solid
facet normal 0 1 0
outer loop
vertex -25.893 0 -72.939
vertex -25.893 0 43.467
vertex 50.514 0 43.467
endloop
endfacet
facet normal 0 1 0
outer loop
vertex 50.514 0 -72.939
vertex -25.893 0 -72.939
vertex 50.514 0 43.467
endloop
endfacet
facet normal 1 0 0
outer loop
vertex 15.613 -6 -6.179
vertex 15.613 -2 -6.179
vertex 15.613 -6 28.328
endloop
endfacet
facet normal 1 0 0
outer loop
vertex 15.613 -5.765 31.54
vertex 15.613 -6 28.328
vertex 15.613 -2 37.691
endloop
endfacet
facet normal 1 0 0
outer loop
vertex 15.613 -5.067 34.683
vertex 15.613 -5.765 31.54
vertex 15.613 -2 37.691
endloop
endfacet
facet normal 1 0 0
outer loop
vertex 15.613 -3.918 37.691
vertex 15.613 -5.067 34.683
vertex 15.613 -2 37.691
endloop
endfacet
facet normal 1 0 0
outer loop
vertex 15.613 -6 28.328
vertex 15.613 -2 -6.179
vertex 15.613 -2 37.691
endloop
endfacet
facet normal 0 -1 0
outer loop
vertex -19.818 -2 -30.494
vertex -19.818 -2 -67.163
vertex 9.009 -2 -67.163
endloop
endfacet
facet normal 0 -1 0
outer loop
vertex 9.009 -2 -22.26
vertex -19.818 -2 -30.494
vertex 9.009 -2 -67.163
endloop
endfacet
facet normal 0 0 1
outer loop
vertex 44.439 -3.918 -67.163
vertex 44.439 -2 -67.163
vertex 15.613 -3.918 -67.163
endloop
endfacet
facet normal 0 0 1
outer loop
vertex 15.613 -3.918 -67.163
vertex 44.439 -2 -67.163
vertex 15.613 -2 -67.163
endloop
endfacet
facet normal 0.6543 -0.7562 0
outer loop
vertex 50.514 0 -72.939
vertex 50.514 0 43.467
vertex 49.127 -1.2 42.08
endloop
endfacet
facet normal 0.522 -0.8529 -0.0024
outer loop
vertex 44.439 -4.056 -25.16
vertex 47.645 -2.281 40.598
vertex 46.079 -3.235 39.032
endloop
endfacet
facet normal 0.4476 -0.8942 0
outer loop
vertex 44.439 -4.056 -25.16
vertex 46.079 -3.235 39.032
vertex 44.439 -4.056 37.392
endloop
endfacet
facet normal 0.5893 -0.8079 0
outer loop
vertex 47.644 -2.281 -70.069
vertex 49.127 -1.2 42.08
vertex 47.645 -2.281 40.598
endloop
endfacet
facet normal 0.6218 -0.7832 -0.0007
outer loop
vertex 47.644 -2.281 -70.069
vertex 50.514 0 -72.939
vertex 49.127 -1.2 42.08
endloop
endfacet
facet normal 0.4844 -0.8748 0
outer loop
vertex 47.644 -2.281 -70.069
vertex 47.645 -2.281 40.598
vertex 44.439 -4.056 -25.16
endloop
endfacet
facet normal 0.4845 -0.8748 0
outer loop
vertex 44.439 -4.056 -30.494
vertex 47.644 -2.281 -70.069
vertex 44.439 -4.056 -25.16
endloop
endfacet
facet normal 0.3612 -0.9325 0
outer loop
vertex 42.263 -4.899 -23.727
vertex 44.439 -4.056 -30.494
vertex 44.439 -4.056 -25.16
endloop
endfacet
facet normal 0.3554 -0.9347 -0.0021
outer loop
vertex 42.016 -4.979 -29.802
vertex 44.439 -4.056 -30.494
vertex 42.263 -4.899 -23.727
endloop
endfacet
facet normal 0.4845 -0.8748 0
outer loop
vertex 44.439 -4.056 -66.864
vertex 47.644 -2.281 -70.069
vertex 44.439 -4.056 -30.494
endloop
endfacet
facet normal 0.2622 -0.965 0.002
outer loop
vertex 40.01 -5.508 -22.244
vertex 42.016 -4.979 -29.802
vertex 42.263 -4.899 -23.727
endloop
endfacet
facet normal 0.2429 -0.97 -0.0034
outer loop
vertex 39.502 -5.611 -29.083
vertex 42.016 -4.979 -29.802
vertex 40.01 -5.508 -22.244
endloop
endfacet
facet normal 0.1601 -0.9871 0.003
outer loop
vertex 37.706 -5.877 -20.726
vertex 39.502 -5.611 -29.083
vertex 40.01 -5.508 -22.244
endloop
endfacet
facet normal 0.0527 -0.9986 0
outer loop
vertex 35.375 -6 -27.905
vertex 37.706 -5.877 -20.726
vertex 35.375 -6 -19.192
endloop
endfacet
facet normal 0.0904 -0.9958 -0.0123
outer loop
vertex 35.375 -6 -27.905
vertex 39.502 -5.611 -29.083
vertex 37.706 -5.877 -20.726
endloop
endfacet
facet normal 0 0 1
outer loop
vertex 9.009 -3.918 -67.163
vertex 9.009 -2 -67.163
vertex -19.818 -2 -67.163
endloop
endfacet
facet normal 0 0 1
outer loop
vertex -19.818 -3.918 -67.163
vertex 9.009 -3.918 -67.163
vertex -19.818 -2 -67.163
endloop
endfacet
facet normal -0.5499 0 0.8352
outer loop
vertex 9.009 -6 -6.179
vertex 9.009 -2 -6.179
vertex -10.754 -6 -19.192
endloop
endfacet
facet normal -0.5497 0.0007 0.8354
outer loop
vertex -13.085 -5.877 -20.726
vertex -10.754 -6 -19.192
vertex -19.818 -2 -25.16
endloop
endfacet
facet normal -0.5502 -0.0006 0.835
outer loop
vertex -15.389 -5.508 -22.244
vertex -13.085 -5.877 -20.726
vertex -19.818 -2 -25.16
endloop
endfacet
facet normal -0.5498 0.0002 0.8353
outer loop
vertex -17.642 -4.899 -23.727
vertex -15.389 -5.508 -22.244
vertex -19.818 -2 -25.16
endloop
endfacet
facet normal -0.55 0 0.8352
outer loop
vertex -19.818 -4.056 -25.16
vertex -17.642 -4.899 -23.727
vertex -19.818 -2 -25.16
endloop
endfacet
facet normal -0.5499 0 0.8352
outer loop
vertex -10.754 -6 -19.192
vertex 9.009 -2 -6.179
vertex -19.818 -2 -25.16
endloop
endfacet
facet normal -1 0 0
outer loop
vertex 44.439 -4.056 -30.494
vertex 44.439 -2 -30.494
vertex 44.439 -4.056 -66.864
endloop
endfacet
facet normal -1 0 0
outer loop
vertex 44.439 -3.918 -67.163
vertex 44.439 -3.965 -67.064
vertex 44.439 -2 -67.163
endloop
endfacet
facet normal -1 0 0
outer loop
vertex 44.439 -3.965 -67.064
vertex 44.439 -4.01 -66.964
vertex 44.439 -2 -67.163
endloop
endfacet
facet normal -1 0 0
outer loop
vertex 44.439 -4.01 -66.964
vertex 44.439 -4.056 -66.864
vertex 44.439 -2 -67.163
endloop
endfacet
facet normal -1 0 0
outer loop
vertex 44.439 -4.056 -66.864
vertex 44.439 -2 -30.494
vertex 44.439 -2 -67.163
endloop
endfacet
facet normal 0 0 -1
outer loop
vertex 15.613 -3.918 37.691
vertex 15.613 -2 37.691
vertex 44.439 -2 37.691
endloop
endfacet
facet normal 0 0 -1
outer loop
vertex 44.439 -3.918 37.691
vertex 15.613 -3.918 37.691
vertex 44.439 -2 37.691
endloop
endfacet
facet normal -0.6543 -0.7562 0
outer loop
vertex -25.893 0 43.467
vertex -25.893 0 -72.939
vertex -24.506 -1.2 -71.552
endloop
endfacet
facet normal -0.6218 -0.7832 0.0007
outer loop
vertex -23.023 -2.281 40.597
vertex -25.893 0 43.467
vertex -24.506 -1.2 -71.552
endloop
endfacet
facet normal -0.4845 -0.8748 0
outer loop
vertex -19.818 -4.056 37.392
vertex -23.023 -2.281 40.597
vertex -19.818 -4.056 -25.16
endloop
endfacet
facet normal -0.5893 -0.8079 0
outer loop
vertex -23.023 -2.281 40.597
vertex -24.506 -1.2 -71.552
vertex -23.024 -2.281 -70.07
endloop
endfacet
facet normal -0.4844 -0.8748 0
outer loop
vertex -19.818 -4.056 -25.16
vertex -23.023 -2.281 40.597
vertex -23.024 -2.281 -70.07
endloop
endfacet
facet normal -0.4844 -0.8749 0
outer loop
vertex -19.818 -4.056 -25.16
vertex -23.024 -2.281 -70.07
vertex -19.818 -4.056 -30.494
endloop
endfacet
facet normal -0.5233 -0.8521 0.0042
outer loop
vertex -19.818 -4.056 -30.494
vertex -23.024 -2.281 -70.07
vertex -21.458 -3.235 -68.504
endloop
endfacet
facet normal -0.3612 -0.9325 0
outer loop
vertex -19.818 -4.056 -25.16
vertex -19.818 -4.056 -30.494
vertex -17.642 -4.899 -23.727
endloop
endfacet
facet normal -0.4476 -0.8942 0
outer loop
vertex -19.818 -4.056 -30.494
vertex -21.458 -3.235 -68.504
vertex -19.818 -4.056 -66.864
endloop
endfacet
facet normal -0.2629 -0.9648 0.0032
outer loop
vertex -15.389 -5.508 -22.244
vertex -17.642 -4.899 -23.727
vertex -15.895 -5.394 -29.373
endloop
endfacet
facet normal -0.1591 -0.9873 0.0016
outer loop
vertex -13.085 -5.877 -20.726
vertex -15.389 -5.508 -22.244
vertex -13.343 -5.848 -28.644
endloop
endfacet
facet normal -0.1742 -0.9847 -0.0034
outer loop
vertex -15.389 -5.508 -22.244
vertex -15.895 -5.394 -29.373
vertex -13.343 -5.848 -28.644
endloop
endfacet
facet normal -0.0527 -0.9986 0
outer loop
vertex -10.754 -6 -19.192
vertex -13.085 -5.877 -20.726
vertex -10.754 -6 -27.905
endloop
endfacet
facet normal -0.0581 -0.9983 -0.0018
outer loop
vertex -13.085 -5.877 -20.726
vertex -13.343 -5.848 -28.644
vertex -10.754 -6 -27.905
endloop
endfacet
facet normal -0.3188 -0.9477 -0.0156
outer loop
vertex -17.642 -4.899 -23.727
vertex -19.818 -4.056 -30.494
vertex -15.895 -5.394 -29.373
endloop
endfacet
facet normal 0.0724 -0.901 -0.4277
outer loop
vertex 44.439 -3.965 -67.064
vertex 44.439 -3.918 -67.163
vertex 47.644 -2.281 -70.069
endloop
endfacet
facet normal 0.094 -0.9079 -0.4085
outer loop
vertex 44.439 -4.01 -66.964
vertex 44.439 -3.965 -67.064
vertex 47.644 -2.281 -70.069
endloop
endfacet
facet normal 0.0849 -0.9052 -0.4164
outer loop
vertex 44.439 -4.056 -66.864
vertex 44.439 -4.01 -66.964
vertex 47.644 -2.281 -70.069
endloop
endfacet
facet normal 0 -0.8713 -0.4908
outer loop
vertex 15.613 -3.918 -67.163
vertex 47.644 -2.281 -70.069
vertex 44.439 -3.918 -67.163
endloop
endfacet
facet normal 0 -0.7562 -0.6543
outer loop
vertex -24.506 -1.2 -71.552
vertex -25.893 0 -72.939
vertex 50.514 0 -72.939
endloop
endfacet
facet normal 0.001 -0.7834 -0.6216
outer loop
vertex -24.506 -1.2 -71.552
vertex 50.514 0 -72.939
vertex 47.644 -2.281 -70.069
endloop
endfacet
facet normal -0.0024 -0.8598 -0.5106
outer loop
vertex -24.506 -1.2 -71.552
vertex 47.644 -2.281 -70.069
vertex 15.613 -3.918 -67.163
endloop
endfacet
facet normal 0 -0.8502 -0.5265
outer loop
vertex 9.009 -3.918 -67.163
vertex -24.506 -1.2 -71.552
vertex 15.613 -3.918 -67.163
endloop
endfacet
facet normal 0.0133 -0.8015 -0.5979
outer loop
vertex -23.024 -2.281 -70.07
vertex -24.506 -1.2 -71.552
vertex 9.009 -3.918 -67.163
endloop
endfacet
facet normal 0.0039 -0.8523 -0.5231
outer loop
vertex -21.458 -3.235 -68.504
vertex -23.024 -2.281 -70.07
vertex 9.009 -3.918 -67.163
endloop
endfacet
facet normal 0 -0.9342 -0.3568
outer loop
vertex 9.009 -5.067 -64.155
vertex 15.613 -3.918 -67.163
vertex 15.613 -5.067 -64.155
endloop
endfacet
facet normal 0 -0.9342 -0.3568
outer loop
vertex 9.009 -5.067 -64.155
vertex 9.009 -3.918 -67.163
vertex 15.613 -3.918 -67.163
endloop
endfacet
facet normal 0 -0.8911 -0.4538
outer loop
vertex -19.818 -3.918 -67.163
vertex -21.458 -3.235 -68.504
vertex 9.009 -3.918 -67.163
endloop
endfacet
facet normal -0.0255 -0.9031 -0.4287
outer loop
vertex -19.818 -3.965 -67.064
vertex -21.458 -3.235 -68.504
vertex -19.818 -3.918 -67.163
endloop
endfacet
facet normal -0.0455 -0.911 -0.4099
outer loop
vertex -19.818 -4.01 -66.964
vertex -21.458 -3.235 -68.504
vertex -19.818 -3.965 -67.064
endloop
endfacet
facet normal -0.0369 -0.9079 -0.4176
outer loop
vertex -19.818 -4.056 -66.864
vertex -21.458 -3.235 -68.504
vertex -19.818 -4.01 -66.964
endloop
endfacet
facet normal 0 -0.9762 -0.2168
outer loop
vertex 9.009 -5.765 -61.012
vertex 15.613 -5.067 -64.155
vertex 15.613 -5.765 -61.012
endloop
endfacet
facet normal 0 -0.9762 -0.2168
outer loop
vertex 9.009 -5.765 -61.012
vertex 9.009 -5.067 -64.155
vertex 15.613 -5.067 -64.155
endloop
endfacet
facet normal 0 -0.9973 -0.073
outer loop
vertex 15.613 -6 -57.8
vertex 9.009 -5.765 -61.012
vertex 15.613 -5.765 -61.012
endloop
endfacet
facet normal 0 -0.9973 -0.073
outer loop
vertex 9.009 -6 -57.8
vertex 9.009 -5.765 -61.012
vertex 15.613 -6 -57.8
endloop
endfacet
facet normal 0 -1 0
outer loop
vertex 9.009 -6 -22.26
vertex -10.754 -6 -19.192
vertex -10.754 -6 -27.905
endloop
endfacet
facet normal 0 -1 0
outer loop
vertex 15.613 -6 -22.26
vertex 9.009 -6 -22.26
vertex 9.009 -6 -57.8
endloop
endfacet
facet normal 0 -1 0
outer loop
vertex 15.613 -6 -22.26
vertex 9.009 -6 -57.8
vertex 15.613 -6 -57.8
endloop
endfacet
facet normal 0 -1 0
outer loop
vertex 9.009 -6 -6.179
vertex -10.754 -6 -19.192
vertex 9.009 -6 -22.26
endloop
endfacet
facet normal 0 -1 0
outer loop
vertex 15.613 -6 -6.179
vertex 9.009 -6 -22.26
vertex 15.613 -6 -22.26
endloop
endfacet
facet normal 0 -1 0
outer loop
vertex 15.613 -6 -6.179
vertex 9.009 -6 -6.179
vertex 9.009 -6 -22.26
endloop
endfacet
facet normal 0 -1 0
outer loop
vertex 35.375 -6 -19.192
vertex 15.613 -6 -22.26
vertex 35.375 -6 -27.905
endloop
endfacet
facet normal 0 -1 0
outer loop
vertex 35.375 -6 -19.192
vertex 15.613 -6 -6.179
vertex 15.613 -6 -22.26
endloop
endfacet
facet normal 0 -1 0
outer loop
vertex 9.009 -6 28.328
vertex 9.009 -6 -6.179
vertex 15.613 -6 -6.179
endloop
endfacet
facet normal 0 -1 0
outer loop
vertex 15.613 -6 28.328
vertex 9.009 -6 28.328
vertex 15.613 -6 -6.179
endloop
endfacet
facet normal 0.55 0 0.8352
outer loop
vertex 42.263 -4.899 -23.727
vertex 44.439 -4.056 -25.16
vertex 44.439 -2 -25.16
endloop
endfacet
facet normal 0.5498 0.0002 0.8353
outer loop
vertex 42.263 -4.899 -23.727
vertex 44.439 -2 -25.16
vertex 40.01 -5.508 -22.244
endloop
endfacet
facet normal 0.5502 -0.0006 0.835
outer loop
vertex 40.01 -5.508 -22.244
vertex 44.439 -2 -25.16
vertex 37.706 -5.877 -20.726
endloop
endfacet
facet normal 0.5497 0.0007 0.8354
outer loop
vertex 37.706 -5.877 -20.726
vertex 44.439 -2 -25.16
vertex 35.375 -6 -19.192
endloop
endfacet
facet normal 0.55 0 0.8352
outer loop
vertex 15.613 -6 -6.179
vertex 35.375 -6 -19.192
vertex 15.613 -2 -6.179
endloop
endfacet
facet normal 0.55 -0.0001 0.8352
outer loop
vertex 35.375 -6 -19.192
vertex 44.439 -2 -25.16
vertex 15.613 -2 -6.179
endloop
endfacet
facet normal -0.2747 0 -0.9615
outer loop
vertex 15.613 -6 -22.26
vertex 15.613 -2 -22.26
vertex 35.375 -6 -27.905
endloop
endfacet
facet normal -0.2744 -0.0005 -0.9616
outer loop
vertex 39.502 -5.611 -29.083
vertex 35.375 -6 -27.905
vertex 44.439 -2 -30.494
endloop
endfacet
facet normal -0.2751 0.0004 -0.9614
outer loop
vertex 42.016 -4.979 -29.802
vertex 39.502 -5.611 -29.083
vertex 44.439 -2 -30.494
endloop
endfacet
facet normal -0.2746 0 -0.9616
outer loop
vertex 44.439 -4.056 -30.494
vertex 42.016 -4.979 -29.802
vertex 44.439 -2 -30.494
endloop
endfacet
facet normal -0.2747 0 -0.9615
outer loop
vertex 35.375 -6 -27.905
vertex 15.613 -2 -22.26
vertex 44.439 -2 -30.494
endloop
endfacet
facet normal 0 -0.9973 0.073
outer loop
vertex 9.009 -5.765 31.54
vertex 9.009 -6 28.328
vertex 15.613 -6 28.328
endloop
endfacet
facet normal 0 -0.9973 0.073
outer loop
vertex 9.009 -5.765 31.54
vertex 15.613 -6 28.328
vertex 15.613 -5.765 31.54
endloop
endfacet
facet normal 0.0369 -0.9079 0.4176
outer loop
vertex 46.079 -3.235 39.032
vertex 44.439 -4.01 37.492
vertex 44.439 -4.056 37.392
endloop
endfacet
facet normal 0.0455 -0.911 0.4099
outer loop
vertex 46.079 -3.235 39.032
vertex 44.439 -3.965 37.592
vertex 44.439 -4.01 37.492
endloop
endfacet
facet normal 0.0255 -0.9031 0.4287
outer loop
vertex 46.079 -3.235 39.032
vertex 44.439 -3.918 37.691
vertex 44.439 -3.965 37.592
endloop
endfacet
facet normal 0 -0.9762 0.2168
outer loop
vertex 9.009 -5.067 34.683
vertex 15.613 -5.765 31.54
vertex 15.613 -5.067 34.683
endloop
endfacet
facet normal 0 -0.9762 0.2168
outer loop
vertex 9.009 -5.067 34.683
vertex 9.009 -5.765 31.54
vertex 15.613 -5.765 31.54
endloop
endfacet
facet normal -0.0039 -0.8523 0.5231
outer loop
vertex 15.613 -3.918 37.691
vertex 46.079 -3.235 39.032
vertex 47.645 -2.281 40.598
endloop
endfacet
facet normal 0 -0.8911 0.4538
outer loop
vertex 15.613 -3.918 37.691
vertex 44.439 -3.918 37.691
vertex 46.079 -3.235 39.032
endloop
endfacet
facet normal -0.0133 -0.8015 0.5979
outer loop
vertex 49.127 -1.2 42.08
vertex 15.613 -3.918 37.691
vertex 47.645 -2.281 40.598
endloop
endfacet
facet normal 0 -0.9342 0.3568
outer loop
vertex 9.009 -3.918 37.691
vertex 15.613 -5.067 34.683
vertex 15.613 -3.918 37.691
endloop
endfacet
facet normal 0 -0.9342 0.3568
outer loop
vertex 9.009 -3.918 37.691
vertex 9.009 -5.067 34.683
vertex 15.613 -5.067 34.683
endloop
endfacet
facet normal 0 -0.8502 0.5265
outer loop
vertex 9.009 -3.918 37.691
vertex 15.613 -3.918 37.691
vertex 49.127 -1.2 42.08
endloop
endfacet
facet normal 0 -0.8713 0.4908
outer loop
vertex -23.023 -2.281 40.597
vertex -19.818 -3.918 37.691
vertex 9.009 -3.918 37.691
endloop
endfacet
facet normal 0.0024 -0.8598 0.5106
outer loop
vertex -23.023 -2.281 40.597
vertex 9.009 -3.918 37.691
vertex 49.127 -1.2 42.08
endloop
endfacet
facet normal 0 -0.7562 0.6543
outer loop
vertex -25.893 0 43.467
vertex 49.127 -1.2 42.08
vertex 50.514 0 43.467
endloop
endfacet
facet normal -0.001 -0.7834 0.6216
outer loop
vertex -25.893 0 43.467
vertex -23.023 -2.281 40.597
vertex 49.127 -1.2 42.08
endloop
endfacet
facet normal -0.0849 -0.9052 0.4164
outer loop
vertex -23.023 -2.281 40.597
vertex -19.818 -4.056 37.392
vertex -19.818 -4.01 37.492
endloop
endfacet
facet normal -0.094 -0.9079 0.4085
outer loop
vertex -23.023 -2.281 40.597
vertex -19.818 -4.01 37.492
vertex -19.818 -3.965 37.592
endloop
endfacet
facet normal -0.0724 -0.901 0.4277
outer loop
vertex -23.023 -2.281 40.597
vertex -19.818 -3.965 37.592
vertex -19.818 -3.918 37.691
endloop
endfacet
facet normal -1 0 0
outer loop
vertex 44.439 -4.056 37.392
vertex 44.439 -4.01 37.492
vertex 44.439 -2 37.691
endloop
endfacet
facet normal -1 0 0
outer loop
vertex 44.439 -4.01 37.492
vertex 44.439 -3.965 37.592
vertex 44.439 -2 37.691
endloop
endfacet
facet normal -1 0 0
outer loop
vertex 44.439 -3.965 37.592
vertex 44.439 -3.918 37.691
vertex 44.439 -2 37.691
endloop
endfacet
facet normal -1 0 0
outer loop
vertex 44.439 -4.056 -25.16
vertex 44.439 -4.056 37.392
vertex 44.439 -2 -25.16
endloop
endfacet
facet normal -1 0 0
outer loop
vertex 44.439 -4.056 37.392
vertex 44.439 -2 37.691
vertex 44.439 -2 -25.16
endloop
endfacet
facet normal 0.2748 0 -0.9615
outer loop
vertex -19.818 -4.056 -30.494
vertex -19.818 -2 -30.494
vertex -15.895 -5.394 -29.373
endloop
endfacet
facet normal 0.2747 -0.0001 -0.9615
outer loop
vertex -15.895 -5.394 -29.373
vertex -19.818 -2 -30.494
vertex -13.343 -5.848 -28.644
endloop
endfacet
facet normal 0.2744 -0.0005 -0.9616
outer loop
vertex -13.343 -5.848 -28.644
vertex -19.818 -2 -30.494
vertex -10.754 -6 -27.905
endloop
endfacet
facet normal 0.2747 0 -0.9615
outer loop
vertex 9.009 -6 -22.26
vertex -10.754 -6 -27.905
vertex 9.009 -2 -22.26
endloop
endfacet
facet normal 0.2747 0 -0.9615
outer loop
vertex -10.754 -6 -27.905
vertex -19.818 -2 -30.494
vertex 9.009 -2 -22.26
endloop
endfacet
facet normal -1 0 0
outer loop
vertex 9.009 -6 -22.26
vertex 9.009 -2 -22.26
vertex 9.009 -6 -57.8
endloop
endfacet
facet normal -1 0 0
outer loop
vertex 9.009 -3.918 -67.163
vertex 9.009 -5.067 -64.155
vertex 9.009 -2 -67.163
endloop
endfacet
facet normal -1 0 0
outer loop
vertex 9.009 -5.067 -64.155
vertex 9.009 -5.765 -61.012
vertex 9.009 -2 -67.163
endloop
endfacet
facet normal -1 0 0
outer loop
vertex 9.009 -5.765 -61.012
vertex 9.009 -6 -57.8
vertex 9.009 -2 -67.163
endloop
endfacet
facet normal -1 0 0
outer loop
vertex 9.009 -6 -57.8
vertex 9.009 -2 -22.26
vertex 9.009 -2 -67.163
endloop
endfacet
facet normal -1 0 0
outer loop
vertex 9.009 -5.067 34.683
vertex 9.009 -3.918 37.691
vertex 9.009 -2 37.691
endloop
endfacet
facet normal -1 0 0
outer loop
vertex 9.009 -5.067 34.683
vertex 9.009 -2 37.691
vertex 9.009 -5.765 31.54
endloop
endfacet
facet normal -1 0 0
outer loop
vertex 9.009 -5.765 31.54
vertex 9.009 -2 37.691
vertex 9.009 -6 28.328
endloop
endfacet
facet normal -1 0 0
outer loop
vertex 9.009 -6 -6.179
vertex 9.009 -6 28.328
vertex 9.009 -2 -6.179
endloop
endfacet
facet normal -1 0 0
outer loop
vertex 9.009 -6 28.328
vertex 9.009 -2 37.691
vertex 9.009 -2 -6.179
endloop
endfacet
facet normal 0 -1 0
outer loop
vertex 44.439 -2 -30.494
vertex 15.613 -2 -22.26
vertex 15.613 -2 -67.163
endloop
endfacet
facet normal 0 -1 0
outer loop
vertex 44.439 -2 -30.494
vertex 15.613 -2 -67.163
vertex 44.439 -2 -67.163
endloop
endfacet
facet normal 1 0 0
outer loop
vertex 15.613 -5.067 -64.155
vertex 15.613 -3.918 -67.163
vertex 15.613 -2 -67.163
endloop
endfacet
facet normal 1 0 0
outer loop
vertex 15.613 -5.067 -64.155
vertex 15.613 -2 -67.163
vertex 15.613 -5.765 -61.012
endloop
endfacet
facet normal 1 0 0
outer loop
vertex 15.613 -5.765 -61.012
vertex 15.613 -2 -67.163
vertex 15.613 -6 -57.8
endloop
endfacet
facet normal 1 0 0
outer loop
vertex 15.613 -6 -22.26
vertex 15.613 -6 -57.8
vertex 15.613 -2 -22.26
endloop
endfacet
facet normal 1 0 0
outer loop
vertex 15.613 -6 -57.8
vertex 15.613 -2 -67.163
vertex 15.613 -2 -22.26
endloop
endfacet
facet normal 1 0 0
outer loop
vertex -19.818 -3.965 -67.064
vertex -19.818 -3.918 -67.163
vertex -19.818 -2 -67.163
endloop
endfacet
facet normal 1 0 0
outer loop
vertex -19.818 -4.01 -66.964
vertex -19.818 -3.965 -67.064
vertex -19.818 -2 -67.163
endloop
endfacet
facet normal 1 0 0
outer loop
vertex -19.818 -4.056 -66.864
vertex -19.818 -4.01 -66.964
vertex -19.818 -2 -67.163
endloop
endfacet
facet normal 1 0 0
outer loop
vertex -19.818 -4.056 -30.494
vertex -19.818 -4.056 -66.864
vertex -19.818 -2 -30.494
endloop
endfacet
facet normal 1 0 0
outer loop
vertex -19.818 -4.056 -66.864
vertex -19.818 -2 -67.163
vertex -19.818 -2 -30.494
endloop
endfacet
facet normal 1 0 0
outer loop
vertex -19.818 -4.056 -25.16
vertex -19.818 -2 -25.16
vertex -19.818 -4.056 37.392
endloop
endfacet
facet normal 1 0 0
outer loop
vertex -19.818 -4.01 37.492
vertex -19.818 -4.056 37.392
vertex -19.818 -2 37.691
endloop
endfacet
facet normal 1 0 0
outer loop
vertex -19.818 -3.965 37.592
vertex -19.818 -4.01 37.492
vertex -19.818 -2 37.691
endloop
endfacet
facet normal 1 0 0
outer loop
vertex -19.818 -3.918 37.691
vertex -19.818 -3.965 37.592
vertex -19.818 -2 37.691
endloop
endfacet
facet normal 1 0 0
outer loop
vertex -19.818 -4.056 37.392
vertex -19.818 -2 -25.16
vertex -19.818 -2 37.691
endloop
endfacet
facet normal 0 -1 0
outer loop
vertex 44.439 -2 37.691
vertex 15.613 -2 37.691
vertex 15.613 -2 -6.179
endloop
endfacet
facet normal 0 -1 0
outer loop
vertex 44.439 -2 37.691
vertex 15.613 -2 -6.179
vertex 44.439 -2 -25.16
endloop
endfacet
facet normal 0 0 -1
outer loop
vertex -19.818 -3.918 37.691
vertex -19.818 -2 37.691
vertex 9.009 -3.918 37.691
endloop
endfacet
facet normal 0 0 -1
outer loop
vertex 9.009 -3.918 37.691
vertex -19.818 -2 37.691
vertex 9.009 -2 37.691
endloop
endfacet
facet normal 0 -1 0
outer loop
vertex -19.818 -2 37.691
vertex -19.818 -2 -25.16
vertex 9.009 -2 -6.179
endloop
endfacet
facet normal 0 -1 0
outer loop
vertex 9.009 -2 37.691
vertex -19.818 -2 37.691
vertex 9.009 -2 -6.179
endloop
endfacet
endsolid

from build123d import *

# Parameters (mm, degrees)
F1_DEPTH    = 6
F0_W        = 76.4068576
F0_H        = 116.405787
F2_DEPTH    = 6
F3_DEPTH    = 2
F4_T1_DEPTH = 192.098587186
F4_T3_DEPTH = 152.099657786


# Not quite as in the source:
# - a fillet or chamfer that OpenCascade refuses, or shapes differently, is made with other operations: its cross-section is extruded or revolved along the edge and cut away or added
# - a feature names something its author has since deleted; it is built from what else it names


with BuildPart() as f1:
    # F0 (on Front) → F1 (new body)
    with BuildSketch(Plane.XZ):
        Polygon((15.6125306649, 37.6914590597), (9.0085306649, 37.6914590597), (9.0085306649, -6.1789248552), (-19.818228389, -25.1597724855), (-19.818228389, -30.4937724855), (9.0085306649, -22.2596581395), (9.0085306649, -67.1633433111), (15.6125306649, -67.1633433111), (15.6125306649, -22.2596581395), (44.4392897189, -30.4937724855), (44.4392897189, -25.1597724855), (15.6125306649, -6.1789248552), align=None)
    extrude(amount=F1_DEPTH)

    # F0 (on Front) → F2 (join)
    with BuildSketch(Plane.XZ):
        with Locations((12.3105306649, -14.7359421257)):
            Rectangle(F0_W, F0_H)
        Polygon((-19.818228389, -25.1597724855), (-19.818228389, 37.6914590597), (9.0085306649, 37.6914590597), (15.6125306649, 37.6914590597), (44.4392897189, 37.6914590597), (44.4392897189, -25.1597724855), (44.4392897189, -30.4937724855), (44.4392897189, -67.1633433111), (15.6125306649, -67.1633433111), (9.0085306649, -67.1633433111), (-19.818228389, -67.1633433111), (-19.818228389, -30.4937724855), align=None, mode=Mode.SUBTRACT)
    extrude(amount=F2_DEPTH)

    # F0 (on Front) → F3 (join)
    with BuildSketch(Plane.XZ):
        Polygon((9.0085306649, 37.6914590597), (-19.818228389, 37.6914590597), (-19.818228389, -25.1597724855), (9.0085306649, -6.1789248552), align=None)
        Polygon((44.4392897189, -67.1633433111), (44.4392897189, -30.4937724855), (15.6125306649, -22.2596581395), (15.6125306649, -67.1633433111), align=None)
        Polygon((9.0085306649, -22.2596581395), (-19.818228389, -30.4937724855), (-19.818228389, -67.1633433111), (9.0085306649, -67.1633433111), align=None)
        Polygon((44.4392897189, 37.6914590597), (15.6125306649, 37.6914590597), (15.6125306649, -6.1789248552), (44.4392897189, -25.1597724855), align=None)
    extrude(amount=F3_DEPTH)

    # F4: fillet of radius 22.098 on 4 edges, made by hand

    # F4_s2 → F4_t1 (cut)
    with BuildSketch(Plane.XY.offset(-110.7852357187)):
        with BuildLine():
            ThreePointArc((-25.8928981351, 0), (-18.8964508458, -4.445310444), (-10.7543380979, -6))
            Line((-10.7543380979, -6), (-25.8928981351, -6))
            Line((-25.8928981351, -6), (-25.8928981351, 0))
        make_face()
        with BuildLine():
            ThreePointArc((50.5139594649, 0), (43.5175121757, -4.445310444), (35.3753994277, -6))
            Line((35.3753994277, -6), (50.5139594649, -6))
            Line((50.5139594649, -6), (50.5139594649, 0))
        make_face()
    extrude(amount=F4_T1_DEPTH, mode=Mode.SUBTRACT)

    # F4_s4 → F4_t3 (cut)
    with BuildSketch(Plane.YZ.offset(-63.7392982281)):
        with BuildLine():
            ThreePointArc((0, -72.9388356257), (-4.445310444, -65.9423883364), (-6, -57.8002755885))
            Line((-6, -57.8002755885), (-6, -72.9388356257))
            Line((-6, -72.9388356257), (0, -72.9388356257))
        make_face()
        with BuildLine():
            ThreePointArc((-6, 28.3283913371), (-4.445310444, 36.4705040851), (0, 43.4669513743))
            Line((0, 43.4669513743), (-6, 43.4669513743))
            Line((-6, 43.4669513743), (-6, 28.3283913371))
        make_face()
    extrude(amount=F4_T3_DEPTH, mode=Mode.SUBTRACT)


solid = f1.part
